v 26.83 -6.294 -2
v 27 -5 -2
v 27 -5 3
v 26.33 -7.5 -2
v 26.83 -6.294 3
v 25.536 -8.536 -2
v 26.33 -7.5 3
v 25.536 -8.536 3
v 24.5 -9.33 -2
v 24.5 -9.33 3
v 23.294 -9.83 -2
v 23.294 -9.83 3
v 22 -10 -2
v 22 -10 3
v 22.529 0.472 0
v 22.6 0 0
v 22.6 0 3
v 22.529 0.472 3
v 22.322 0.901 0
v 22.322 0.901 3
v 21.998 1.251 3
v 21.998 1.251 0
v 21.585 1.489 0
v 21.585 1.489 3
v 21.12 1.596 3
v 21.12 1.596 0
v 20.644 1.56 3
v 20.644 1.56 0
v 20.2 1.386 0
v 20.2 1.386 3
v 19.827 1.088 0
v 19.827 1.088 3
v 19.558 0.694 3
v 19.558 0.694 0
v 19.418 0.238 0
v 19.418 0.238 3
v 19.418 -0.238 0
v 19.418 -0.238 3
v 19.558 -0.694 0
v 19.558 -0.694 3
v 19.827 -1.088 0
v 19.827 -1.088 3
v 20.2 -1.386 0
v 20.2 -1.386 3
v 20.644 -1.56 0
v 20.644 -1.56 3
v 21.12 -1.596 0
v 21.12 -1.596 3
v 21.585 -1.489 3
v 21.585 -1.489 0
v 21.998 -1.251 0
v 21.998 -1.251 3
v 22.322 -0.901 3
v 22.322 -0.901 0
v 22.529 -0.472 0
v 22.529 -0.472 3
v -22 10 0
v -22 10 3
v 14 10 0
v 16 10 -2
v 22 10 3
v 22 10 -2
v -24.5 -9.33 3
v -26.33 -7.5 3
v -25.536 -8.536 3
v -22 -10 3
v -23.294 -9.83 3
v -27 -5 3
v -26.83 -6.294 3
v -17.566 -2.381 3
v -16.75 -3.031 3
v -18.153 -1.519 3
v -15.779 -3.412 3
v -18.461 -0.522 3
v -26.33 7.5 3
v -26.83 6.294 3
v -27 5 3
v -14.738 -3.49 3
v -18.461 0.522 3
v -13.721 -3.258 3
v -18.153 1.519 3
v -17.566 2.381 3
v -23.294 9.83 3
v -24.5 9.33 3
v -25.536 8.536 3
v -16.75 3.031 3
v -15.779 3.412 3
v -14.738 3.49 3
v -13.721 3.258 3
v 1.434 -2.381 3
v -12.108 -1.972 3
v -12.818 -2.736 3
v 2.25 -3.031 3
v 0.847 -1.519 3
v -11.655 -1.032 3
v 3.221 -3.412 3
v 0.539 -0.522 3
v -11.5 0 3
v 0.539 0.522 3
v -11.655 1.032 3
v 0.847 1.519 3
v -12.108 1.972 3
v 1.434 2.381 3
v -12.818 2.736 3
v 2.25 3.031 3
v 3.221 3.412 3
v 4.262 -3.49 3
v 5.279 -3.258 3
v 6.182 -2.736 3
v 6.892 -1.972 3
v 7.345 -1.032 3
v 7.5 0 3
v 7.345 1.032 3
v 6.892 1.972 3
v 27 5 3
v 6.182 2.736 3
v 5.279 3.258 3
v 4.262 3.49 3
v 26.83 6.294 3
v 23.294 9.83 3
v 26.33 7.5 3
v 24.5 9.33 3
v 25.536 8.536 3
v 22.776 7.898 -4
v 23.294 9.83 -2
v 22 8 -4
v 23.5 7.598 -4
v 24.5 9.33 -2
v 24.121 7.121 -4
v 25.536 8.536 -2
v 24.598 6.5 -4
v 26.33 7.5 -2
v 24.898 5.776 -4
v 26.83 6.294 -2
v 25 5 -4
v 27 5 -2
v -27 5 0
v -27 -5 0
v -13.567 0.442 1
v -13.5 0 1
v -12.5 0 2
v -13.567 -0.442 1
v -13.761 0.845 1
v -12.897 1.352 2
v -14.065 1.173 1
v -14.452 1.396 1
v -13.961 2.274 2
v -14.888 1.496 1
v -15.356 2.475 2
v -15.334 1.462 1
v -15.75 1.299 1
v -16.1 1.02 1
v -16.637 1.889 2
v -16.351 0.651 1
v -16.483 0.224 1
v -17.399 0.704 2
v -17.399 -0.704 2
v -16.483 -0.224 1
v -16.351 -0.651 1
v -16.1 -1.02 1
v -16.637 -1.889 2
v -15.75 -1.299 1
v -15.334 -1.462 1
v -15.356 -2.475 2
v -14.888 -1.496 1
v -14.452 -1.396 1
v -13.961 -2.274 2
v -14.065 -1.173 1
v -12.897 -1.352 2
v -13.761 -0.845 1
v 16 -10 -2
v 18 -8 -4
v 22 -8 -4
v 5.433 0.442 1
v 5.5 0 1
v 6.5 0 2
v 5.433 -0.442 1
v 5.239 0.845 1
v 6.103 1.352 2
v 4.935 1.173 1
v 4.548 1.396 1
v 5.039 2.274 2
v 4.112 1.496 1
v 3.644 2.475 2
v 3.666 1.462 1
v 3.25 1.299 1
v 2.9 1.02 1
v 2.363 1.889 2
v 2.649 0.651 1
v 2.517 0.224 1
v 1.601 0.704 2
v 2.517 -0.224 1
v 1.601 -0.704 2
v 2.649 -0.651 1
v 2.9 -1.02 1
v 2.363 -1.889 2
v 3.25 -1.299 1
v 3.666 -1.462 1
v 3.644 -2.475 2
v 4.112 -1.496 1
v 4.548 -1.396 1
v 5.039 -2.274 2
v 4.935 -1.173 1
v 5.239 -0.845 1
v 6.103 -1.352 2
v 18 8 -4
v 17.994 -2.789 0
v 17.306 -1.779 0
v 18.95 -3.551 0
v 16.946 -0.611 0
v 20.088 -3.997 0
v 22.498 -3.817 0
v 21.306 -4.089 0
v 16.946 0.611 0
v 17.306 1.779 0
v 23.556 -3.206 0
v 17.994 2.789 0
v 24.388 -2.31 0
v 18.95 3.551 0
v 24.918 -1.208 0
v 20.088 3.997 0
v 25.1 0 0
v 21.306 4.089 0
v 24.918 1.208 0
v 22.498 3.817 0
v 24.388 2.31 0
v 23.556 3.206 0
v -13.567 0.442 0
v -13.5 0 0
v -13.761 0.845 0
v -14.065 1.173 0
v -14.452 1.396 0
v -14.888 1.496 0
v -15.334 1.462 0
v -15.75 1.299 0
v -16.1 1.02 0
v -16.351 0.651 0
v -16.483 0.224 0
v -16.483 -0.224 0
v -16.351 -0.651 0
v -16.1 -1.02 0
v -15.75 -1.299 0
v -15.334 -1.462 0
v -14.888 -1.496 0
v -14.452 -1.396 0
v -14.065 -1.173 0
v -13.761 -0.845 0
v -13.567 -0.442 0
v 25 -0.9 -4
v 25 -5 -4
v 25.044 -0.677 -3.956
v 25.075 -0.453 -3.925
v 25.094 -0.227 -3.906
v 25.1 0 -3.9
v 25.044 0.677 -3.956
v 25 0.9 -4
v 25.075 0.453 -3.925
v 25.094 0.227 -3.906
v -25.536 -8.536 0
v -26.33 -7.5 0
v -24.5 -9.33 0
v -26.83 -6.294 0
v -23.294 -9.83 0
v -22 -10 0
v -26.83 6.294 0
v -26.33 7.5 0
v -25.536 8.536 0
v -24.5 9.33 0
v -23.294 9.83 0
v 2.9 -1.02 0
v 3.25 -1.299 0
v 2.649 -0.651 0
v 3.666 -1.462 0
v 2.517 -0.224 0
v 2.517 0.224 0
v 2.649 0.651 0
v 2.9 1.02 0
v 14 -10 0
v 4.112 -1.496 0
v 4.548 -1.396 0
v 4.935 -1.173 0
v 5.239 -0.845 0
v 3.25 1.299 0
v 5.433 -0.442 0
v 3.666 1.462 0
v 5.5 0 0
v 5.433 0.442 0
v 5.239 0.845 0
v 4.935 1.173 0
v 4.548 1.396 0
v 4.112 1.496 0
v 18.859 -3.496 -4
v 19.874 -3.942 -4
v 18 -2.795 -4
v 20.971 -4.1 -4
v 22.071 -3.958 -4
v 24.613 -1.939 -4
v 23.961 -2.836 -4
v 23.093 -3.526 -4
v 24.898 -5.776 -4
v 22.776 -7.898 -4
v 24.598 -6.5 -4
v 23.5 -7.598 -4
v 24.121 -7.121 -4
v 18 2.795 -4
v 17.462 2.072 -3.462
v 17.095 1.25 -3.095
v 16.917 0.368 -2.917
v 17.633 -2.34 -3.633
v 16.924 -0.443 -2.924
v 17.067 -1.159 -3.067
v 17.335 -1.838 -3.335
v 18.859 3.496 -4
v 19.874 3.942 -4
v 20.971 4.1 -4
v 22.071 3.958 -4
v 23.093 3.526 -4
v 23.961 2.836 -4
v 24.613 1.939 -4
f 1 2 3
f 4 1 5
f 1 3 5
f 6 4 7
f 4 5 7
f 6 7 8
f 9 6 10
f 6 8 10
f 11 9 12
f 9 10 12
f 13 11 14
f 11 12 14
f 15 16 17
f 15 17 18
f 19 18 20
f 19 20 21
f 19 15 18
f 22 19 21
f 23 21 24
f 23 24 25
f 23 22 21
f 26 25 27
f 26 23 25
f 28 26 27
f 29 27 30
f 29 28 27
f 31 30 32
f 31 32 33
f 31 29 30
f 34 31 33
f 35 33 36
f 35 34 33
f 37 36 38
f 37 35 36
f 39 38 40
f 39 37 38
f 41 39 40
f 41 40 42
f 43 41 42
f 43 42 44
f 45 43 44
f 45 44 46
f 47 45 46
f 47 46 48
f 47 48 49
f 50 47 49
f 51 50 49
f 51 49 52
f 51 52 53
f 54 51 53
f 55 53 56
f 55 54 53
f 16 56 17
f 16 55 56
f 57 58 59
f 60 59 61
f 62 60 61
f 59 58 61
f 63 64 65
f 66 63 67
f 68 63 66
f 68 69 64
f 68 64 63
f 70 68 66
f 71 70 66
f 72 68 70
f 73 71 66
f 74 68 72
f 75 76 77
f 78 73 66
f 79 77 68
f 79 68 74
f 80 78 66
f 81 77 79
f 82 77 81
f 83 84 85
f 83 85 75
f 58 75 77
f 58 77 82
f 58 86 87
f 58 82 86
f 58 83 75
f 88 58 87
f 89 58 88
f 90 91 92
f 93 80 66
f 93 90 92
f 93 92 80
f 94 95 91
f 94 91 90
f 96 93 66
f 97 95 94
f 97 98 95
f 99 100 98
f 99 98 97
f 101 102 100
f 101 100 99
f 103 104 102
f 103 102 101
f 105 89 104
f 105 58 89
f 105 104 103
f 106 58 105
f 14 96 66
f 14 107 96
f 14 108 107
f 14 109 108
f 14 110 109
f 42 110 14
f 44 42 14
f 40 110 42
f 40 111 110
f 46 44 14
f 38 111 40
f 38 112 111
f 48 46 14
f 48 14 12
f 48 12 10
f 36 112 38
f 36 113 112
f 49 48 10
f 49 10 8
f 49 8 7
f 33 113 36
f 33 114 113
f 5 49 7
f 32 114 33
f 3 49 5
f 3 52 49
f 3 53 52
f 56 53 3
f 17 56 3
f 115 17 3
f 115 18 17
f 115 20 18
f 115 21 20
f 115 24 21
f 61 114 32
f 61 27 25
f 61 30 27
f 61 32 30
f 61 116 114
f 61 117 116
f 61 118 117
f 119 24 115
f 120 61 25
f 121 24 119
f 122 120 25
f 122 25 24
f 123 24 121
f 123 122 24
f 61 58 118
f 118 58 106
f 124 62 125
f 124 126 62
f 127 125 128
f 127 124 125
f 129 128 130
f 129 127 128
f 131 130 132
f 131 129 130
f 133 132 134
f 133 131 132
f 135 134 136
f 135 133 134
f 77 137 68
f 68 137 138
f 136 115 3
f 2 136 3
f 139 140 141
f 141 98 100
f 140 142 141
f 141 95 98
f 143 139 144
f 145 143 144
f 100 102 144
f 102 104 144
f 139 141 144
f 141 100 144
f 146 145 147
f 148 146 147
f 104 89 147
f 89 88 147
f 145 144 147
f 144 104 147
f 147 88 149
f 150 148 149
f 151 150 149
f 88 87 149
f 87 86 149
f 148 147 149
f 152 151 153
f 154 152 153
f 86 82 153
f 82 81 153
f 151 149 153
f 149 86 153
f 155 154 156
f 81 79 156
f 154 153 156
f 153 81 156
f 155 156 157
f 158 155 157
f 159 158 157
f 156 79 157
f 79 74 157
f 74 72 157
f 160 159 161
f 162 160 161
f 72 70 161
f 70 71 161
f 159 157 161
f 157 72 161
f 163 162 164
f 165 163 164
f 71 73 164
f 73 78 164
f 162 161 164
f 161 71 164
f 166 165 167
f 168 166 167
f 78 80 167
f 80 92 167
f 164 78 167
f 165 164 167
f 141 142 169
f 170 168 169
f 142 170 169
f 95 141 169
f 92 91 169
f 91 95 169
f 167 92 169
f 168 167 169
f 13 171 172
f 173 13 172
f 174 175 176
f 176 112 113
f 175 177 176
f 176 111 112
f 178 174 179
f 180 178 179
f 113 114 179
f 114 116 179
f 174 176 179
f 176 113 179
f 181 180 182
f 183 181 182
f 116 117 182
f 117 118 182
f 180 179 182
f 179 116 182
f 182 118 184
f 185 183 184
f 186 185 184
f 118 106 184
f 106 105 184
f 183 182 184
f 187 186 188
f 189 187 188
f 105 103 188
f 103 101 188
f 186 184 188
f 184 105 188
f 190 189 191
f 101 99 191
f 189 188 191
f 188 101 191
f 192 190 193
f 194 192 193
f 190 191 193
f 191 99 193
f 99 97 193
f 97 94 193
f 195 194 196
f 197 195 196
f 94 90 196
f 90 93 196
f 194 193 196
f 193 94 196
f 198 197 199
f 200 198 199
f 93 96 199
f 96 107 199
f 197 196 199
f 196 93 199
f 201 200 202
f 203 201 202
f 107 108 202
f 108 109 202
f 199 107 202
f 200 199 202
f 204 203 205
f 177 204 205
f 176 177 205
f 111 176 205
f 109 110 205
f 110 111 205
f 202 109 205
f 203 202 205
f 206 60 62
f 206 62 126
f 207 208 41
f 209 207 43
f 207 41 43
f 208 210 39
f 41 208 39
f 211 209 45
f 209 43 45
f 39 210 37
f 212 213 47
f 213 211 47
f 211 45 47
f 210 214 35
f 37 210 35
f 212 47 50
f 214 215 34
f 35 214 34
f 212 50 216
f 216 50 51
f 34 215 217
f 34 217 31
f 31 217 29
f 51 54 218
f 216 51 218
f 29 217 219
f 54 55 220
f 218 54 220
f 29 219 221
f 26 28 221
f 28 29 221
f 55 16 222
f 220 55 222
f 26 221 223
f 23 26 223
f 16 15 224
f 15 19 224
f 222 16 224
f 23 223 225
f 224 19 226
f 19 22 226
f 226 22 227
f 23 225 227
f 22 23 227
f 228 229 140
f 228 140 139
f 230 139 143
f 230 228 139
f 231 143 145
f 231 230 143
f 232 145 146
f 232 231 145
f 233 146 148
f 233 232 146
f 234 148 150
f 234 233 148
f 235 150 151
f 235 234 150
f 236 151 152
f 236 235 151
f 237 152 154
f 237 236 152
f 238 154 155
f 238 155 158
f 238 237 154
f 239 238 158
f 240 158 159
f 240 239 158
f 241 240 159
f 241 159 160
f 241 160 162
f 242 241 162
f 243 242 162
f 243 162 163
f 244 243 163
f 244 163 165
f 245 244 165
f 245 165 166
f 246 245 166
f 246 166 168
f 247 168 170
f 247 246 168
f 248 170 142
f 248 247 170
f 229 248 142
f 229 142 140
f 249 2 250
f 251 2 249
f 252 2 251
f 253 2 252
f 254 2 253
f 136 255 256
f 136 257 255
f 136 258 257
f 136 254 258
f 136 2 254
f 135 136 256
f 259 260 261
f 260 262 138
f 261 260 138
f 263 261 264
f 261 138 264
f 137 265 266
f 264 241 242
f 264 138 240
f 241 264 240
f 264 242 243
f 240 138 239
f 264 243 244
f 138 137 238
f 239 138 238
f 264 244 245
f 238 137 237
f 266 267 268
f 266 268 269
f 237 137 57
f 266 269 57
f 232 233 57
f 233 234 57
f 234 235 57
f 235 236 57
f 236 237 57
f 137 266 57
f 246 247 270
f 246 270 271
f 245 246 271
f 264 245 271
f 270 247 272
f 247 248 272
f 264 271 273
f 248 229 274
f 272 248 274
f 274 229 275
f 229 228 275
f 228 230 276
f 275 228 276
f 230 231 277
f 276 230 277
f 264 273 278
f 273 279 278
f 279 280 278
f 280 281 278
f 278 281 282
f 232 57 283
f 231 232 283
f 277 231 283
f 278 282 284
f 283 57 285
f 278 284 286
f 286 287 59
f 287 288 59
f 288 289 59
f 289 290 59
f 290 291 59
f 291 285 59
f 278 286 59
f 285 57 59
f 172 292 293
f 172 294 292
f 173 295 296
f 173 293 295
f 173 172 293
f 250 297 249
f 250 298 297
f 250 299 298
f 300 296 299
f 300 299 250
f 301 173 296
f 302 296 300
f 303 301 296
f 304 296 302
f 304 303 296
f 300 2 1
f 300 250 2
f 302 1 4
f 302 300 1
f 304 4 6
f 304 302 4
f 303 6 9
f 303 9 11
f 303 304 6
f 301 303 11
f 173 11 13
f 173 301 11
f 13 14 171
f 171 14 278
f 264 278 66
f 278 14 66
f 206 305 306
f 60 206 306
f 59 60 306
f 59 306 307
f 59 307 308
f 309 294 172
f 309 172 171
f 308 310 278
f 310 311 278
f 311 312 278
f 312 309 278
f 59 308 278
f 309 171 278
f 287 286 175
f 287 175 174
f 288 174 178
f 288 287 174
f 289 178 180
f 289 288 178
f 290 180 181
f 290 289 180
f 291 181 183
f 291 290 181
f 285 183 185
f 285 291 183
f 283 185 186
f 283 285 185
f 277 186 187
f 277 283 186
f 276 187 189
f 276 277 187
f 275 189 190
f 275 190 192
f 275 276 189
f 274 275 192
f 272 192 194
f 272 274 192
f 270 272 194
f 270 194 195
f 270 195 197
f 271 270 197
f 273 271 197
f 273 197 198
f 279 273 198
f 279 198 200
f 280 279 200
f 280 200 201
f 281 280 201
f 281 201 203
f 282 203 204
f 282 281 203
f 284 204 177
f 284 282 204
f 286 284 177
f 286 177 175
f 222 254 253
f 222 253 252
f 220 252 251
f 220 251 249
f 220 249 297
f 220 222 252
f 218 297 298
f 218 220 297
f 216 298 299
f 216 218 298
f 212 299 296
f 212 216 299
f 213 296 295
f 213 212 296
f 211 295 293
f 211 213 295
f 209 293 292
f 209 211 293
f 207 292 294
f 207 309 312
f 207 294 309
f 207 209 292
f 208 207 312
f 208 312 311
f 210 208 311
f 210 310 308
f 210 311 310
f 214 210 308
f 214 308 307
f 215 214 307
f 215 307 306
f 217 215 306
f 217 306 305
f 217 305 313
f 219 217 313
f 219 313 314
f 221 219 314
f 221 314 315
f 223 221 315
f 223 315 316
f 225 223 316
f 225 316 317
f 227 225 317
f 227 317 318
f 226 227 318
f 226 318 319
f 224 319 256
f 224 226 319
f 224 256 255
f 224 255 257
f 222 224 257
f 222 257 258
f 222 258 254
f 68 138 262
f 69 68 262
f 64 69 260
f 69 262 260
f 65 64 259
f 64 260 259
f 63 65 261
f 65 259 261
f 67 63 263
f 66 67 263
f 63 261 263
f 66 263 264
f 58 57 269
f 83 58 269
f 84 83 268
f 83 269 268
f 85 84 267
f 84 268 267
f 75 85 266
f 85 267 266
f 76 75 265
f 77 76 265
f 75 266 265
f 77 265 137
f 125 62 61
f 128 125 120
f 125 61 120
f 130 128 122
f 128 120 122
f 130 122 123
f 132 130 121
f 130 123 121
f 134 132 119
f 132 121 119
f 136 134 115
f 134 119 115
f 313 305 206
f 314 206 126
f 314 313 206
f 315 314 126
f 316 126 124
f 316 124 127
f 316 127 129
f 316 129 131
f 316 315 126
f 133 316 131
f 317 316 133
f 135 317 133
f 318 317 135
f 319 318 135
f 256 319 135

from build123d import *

# Parameters (mm, degrees)
F0_R        = 1.5
F0_R_2      = 1.6
F1_DEPTH    = 3
F2_SIZE     = 2
F3_R        = 4.1
F4_DEPTH    = 4
F5_T4_DEPTH = 40.5734639037
F6_T1_DEPTH = 9.1433659759
F6_T3_DEPTH = 10
F6_T6_ANGLE = 90
F6_T8_ANGLE = 90


# Not quite as in the source:
# - a fillet or chamfer that OpenCascade refuses, or shapes differently, is made with other operations: its cross-section is extruded or revolved along the edge and cut away or added


with BuildPart() as f1:
    # F0 (on Top) → F1 (new body)
    with BuildSketch(Plane.XY):
        with BuildLine():
            Line((22, 10), (-22, 10))
            ThreePointArc((-22, 10), (-25.5355339059, 8.5355339059), (-27, 5))
            Line((-27, 5), (-27, -5))
            ThreePointArc((-27, -5), (-25.5355339059, -8.5355339059), (-22, -10))
            Line((-22, -10), (22, -10))
            ThreePointArc((22, -10), (25.5355339059, -8.5355339059), (27, -5))
            Line((27, -5), (27, 5))
            ThreePointArc((27, 5), (25.5355339059, 8.5355339059), (22, 10))
        make_face()
        with Locations((-15, 0)):
            Circle(F0_R, mode=Mode.SUBTRACT)
        with Locations((4, 0)):
            Circle(F0_R, mode=Mode.SUBTRACT)
        with Locations((21, 0)):
            Circle(F0_R_2, mode=Mode.SUBTRACT)
    extrude(amount=F1_DEPTH)

    # F2
    f2_edges = [f1.edges().sort_by_distance(p)[0] for p in [
        (-16.5, 0, 3),
        (2.5, 0, 3),
    ]]
    chamfer(f2_edges, length=F2_SIZE)

    # F3 (on face) → F4 (join)
    with BuildSketch(Plane(origin=(0, 0, 0), x_dir=(1, 0, 0), z_dir=(0, 0, -1))):
        with BuildLine():
            Line((14, 10), (14, -10))
            Line((14, -10), (22, -10))
            ThreePointArc((22, -10), (25.5355339059, -8.5355339059), (27, -5))
            Line((27, -5), (27, 5))
            ThreePointArc((27, 5), (25.5355339059, 8.5355339059), (22, 10))
            Line((22, 10), (14, 10))
        make_face()
        with Locations((21, 0)):
            Circle(F3_R, mode=Mode.SUBTRACT)
    extrude(amount=F4_DEPTH)

    # F5: chamfer of 4 on 1 edges, made by hand


with BuildPart() as f5_tool2:
    # F5_s3 → F5_t4 (new body)
    with BuildSketch(Plane.XZ.offset(20.2867319519)):
        Polygon((18, -4), (14, 0), (14, -4), align=None)
    extrude(amount=-F5_T4_DEPTH)

    split(bisect_by=Plane.XY, keep=Keep.BOTTOM)


with BuildPart() as f1_1:
    add(f1.part)

    # F5_t1: cut F5_tool2
    add(f5_tool2.part, mode=Mode.SUBTRACT)

    # F6: chamfer of 2 on 5 edges, made by hand

    # F6_s2 → F6_t1 (cut)
    with BuildSketch(Plane.YZ.offset(12.8566340241)):
        Polygon((-10, -2), (-8, -4), (-10, -4), align=None)
        Polygon((10, -2), (8, -4), (10, -4), align=None)
    extrude(amount=F6_T1_DEPTH, mode=Mode.SUBTRACT)

    # F6_s4 → F6_t3 (cut)
    with BuildSketch(Plane.XZ.offset(-5)):
        Polygon((27, -2), (25, -4), (27, -4), align=None)
    extrude(amount=F6_T3_DEPTH, mode=Mode.SUBTRACT)

    # F6_s5 → F6_t6 (revolve, cut)
    with BuildSketch(Plane.XZ.offset(5)):
        Polygon((27, -2), (25, -4), (27, -4), align=None)
    revolve(axis=Axis((22, -5, -4), (0, 0, -1)), revolution_arc=F6_T6_ANGLE, mode=Mode.SUBTRACT)

    # F6_s7 → F6_t8 (revolve, cut)
    with BuildSketch(Plane.YZ.offset(22)):
        Polygon((10, -2), (8, -4), (10, -4), align=None)
    revolve(axis=Axis((22, 5, -4), (0, 0, -1)), revolution_arc=F6_T8_ANGLE, mode=Mode.SUBTRACT)


solid = f1_1.part
